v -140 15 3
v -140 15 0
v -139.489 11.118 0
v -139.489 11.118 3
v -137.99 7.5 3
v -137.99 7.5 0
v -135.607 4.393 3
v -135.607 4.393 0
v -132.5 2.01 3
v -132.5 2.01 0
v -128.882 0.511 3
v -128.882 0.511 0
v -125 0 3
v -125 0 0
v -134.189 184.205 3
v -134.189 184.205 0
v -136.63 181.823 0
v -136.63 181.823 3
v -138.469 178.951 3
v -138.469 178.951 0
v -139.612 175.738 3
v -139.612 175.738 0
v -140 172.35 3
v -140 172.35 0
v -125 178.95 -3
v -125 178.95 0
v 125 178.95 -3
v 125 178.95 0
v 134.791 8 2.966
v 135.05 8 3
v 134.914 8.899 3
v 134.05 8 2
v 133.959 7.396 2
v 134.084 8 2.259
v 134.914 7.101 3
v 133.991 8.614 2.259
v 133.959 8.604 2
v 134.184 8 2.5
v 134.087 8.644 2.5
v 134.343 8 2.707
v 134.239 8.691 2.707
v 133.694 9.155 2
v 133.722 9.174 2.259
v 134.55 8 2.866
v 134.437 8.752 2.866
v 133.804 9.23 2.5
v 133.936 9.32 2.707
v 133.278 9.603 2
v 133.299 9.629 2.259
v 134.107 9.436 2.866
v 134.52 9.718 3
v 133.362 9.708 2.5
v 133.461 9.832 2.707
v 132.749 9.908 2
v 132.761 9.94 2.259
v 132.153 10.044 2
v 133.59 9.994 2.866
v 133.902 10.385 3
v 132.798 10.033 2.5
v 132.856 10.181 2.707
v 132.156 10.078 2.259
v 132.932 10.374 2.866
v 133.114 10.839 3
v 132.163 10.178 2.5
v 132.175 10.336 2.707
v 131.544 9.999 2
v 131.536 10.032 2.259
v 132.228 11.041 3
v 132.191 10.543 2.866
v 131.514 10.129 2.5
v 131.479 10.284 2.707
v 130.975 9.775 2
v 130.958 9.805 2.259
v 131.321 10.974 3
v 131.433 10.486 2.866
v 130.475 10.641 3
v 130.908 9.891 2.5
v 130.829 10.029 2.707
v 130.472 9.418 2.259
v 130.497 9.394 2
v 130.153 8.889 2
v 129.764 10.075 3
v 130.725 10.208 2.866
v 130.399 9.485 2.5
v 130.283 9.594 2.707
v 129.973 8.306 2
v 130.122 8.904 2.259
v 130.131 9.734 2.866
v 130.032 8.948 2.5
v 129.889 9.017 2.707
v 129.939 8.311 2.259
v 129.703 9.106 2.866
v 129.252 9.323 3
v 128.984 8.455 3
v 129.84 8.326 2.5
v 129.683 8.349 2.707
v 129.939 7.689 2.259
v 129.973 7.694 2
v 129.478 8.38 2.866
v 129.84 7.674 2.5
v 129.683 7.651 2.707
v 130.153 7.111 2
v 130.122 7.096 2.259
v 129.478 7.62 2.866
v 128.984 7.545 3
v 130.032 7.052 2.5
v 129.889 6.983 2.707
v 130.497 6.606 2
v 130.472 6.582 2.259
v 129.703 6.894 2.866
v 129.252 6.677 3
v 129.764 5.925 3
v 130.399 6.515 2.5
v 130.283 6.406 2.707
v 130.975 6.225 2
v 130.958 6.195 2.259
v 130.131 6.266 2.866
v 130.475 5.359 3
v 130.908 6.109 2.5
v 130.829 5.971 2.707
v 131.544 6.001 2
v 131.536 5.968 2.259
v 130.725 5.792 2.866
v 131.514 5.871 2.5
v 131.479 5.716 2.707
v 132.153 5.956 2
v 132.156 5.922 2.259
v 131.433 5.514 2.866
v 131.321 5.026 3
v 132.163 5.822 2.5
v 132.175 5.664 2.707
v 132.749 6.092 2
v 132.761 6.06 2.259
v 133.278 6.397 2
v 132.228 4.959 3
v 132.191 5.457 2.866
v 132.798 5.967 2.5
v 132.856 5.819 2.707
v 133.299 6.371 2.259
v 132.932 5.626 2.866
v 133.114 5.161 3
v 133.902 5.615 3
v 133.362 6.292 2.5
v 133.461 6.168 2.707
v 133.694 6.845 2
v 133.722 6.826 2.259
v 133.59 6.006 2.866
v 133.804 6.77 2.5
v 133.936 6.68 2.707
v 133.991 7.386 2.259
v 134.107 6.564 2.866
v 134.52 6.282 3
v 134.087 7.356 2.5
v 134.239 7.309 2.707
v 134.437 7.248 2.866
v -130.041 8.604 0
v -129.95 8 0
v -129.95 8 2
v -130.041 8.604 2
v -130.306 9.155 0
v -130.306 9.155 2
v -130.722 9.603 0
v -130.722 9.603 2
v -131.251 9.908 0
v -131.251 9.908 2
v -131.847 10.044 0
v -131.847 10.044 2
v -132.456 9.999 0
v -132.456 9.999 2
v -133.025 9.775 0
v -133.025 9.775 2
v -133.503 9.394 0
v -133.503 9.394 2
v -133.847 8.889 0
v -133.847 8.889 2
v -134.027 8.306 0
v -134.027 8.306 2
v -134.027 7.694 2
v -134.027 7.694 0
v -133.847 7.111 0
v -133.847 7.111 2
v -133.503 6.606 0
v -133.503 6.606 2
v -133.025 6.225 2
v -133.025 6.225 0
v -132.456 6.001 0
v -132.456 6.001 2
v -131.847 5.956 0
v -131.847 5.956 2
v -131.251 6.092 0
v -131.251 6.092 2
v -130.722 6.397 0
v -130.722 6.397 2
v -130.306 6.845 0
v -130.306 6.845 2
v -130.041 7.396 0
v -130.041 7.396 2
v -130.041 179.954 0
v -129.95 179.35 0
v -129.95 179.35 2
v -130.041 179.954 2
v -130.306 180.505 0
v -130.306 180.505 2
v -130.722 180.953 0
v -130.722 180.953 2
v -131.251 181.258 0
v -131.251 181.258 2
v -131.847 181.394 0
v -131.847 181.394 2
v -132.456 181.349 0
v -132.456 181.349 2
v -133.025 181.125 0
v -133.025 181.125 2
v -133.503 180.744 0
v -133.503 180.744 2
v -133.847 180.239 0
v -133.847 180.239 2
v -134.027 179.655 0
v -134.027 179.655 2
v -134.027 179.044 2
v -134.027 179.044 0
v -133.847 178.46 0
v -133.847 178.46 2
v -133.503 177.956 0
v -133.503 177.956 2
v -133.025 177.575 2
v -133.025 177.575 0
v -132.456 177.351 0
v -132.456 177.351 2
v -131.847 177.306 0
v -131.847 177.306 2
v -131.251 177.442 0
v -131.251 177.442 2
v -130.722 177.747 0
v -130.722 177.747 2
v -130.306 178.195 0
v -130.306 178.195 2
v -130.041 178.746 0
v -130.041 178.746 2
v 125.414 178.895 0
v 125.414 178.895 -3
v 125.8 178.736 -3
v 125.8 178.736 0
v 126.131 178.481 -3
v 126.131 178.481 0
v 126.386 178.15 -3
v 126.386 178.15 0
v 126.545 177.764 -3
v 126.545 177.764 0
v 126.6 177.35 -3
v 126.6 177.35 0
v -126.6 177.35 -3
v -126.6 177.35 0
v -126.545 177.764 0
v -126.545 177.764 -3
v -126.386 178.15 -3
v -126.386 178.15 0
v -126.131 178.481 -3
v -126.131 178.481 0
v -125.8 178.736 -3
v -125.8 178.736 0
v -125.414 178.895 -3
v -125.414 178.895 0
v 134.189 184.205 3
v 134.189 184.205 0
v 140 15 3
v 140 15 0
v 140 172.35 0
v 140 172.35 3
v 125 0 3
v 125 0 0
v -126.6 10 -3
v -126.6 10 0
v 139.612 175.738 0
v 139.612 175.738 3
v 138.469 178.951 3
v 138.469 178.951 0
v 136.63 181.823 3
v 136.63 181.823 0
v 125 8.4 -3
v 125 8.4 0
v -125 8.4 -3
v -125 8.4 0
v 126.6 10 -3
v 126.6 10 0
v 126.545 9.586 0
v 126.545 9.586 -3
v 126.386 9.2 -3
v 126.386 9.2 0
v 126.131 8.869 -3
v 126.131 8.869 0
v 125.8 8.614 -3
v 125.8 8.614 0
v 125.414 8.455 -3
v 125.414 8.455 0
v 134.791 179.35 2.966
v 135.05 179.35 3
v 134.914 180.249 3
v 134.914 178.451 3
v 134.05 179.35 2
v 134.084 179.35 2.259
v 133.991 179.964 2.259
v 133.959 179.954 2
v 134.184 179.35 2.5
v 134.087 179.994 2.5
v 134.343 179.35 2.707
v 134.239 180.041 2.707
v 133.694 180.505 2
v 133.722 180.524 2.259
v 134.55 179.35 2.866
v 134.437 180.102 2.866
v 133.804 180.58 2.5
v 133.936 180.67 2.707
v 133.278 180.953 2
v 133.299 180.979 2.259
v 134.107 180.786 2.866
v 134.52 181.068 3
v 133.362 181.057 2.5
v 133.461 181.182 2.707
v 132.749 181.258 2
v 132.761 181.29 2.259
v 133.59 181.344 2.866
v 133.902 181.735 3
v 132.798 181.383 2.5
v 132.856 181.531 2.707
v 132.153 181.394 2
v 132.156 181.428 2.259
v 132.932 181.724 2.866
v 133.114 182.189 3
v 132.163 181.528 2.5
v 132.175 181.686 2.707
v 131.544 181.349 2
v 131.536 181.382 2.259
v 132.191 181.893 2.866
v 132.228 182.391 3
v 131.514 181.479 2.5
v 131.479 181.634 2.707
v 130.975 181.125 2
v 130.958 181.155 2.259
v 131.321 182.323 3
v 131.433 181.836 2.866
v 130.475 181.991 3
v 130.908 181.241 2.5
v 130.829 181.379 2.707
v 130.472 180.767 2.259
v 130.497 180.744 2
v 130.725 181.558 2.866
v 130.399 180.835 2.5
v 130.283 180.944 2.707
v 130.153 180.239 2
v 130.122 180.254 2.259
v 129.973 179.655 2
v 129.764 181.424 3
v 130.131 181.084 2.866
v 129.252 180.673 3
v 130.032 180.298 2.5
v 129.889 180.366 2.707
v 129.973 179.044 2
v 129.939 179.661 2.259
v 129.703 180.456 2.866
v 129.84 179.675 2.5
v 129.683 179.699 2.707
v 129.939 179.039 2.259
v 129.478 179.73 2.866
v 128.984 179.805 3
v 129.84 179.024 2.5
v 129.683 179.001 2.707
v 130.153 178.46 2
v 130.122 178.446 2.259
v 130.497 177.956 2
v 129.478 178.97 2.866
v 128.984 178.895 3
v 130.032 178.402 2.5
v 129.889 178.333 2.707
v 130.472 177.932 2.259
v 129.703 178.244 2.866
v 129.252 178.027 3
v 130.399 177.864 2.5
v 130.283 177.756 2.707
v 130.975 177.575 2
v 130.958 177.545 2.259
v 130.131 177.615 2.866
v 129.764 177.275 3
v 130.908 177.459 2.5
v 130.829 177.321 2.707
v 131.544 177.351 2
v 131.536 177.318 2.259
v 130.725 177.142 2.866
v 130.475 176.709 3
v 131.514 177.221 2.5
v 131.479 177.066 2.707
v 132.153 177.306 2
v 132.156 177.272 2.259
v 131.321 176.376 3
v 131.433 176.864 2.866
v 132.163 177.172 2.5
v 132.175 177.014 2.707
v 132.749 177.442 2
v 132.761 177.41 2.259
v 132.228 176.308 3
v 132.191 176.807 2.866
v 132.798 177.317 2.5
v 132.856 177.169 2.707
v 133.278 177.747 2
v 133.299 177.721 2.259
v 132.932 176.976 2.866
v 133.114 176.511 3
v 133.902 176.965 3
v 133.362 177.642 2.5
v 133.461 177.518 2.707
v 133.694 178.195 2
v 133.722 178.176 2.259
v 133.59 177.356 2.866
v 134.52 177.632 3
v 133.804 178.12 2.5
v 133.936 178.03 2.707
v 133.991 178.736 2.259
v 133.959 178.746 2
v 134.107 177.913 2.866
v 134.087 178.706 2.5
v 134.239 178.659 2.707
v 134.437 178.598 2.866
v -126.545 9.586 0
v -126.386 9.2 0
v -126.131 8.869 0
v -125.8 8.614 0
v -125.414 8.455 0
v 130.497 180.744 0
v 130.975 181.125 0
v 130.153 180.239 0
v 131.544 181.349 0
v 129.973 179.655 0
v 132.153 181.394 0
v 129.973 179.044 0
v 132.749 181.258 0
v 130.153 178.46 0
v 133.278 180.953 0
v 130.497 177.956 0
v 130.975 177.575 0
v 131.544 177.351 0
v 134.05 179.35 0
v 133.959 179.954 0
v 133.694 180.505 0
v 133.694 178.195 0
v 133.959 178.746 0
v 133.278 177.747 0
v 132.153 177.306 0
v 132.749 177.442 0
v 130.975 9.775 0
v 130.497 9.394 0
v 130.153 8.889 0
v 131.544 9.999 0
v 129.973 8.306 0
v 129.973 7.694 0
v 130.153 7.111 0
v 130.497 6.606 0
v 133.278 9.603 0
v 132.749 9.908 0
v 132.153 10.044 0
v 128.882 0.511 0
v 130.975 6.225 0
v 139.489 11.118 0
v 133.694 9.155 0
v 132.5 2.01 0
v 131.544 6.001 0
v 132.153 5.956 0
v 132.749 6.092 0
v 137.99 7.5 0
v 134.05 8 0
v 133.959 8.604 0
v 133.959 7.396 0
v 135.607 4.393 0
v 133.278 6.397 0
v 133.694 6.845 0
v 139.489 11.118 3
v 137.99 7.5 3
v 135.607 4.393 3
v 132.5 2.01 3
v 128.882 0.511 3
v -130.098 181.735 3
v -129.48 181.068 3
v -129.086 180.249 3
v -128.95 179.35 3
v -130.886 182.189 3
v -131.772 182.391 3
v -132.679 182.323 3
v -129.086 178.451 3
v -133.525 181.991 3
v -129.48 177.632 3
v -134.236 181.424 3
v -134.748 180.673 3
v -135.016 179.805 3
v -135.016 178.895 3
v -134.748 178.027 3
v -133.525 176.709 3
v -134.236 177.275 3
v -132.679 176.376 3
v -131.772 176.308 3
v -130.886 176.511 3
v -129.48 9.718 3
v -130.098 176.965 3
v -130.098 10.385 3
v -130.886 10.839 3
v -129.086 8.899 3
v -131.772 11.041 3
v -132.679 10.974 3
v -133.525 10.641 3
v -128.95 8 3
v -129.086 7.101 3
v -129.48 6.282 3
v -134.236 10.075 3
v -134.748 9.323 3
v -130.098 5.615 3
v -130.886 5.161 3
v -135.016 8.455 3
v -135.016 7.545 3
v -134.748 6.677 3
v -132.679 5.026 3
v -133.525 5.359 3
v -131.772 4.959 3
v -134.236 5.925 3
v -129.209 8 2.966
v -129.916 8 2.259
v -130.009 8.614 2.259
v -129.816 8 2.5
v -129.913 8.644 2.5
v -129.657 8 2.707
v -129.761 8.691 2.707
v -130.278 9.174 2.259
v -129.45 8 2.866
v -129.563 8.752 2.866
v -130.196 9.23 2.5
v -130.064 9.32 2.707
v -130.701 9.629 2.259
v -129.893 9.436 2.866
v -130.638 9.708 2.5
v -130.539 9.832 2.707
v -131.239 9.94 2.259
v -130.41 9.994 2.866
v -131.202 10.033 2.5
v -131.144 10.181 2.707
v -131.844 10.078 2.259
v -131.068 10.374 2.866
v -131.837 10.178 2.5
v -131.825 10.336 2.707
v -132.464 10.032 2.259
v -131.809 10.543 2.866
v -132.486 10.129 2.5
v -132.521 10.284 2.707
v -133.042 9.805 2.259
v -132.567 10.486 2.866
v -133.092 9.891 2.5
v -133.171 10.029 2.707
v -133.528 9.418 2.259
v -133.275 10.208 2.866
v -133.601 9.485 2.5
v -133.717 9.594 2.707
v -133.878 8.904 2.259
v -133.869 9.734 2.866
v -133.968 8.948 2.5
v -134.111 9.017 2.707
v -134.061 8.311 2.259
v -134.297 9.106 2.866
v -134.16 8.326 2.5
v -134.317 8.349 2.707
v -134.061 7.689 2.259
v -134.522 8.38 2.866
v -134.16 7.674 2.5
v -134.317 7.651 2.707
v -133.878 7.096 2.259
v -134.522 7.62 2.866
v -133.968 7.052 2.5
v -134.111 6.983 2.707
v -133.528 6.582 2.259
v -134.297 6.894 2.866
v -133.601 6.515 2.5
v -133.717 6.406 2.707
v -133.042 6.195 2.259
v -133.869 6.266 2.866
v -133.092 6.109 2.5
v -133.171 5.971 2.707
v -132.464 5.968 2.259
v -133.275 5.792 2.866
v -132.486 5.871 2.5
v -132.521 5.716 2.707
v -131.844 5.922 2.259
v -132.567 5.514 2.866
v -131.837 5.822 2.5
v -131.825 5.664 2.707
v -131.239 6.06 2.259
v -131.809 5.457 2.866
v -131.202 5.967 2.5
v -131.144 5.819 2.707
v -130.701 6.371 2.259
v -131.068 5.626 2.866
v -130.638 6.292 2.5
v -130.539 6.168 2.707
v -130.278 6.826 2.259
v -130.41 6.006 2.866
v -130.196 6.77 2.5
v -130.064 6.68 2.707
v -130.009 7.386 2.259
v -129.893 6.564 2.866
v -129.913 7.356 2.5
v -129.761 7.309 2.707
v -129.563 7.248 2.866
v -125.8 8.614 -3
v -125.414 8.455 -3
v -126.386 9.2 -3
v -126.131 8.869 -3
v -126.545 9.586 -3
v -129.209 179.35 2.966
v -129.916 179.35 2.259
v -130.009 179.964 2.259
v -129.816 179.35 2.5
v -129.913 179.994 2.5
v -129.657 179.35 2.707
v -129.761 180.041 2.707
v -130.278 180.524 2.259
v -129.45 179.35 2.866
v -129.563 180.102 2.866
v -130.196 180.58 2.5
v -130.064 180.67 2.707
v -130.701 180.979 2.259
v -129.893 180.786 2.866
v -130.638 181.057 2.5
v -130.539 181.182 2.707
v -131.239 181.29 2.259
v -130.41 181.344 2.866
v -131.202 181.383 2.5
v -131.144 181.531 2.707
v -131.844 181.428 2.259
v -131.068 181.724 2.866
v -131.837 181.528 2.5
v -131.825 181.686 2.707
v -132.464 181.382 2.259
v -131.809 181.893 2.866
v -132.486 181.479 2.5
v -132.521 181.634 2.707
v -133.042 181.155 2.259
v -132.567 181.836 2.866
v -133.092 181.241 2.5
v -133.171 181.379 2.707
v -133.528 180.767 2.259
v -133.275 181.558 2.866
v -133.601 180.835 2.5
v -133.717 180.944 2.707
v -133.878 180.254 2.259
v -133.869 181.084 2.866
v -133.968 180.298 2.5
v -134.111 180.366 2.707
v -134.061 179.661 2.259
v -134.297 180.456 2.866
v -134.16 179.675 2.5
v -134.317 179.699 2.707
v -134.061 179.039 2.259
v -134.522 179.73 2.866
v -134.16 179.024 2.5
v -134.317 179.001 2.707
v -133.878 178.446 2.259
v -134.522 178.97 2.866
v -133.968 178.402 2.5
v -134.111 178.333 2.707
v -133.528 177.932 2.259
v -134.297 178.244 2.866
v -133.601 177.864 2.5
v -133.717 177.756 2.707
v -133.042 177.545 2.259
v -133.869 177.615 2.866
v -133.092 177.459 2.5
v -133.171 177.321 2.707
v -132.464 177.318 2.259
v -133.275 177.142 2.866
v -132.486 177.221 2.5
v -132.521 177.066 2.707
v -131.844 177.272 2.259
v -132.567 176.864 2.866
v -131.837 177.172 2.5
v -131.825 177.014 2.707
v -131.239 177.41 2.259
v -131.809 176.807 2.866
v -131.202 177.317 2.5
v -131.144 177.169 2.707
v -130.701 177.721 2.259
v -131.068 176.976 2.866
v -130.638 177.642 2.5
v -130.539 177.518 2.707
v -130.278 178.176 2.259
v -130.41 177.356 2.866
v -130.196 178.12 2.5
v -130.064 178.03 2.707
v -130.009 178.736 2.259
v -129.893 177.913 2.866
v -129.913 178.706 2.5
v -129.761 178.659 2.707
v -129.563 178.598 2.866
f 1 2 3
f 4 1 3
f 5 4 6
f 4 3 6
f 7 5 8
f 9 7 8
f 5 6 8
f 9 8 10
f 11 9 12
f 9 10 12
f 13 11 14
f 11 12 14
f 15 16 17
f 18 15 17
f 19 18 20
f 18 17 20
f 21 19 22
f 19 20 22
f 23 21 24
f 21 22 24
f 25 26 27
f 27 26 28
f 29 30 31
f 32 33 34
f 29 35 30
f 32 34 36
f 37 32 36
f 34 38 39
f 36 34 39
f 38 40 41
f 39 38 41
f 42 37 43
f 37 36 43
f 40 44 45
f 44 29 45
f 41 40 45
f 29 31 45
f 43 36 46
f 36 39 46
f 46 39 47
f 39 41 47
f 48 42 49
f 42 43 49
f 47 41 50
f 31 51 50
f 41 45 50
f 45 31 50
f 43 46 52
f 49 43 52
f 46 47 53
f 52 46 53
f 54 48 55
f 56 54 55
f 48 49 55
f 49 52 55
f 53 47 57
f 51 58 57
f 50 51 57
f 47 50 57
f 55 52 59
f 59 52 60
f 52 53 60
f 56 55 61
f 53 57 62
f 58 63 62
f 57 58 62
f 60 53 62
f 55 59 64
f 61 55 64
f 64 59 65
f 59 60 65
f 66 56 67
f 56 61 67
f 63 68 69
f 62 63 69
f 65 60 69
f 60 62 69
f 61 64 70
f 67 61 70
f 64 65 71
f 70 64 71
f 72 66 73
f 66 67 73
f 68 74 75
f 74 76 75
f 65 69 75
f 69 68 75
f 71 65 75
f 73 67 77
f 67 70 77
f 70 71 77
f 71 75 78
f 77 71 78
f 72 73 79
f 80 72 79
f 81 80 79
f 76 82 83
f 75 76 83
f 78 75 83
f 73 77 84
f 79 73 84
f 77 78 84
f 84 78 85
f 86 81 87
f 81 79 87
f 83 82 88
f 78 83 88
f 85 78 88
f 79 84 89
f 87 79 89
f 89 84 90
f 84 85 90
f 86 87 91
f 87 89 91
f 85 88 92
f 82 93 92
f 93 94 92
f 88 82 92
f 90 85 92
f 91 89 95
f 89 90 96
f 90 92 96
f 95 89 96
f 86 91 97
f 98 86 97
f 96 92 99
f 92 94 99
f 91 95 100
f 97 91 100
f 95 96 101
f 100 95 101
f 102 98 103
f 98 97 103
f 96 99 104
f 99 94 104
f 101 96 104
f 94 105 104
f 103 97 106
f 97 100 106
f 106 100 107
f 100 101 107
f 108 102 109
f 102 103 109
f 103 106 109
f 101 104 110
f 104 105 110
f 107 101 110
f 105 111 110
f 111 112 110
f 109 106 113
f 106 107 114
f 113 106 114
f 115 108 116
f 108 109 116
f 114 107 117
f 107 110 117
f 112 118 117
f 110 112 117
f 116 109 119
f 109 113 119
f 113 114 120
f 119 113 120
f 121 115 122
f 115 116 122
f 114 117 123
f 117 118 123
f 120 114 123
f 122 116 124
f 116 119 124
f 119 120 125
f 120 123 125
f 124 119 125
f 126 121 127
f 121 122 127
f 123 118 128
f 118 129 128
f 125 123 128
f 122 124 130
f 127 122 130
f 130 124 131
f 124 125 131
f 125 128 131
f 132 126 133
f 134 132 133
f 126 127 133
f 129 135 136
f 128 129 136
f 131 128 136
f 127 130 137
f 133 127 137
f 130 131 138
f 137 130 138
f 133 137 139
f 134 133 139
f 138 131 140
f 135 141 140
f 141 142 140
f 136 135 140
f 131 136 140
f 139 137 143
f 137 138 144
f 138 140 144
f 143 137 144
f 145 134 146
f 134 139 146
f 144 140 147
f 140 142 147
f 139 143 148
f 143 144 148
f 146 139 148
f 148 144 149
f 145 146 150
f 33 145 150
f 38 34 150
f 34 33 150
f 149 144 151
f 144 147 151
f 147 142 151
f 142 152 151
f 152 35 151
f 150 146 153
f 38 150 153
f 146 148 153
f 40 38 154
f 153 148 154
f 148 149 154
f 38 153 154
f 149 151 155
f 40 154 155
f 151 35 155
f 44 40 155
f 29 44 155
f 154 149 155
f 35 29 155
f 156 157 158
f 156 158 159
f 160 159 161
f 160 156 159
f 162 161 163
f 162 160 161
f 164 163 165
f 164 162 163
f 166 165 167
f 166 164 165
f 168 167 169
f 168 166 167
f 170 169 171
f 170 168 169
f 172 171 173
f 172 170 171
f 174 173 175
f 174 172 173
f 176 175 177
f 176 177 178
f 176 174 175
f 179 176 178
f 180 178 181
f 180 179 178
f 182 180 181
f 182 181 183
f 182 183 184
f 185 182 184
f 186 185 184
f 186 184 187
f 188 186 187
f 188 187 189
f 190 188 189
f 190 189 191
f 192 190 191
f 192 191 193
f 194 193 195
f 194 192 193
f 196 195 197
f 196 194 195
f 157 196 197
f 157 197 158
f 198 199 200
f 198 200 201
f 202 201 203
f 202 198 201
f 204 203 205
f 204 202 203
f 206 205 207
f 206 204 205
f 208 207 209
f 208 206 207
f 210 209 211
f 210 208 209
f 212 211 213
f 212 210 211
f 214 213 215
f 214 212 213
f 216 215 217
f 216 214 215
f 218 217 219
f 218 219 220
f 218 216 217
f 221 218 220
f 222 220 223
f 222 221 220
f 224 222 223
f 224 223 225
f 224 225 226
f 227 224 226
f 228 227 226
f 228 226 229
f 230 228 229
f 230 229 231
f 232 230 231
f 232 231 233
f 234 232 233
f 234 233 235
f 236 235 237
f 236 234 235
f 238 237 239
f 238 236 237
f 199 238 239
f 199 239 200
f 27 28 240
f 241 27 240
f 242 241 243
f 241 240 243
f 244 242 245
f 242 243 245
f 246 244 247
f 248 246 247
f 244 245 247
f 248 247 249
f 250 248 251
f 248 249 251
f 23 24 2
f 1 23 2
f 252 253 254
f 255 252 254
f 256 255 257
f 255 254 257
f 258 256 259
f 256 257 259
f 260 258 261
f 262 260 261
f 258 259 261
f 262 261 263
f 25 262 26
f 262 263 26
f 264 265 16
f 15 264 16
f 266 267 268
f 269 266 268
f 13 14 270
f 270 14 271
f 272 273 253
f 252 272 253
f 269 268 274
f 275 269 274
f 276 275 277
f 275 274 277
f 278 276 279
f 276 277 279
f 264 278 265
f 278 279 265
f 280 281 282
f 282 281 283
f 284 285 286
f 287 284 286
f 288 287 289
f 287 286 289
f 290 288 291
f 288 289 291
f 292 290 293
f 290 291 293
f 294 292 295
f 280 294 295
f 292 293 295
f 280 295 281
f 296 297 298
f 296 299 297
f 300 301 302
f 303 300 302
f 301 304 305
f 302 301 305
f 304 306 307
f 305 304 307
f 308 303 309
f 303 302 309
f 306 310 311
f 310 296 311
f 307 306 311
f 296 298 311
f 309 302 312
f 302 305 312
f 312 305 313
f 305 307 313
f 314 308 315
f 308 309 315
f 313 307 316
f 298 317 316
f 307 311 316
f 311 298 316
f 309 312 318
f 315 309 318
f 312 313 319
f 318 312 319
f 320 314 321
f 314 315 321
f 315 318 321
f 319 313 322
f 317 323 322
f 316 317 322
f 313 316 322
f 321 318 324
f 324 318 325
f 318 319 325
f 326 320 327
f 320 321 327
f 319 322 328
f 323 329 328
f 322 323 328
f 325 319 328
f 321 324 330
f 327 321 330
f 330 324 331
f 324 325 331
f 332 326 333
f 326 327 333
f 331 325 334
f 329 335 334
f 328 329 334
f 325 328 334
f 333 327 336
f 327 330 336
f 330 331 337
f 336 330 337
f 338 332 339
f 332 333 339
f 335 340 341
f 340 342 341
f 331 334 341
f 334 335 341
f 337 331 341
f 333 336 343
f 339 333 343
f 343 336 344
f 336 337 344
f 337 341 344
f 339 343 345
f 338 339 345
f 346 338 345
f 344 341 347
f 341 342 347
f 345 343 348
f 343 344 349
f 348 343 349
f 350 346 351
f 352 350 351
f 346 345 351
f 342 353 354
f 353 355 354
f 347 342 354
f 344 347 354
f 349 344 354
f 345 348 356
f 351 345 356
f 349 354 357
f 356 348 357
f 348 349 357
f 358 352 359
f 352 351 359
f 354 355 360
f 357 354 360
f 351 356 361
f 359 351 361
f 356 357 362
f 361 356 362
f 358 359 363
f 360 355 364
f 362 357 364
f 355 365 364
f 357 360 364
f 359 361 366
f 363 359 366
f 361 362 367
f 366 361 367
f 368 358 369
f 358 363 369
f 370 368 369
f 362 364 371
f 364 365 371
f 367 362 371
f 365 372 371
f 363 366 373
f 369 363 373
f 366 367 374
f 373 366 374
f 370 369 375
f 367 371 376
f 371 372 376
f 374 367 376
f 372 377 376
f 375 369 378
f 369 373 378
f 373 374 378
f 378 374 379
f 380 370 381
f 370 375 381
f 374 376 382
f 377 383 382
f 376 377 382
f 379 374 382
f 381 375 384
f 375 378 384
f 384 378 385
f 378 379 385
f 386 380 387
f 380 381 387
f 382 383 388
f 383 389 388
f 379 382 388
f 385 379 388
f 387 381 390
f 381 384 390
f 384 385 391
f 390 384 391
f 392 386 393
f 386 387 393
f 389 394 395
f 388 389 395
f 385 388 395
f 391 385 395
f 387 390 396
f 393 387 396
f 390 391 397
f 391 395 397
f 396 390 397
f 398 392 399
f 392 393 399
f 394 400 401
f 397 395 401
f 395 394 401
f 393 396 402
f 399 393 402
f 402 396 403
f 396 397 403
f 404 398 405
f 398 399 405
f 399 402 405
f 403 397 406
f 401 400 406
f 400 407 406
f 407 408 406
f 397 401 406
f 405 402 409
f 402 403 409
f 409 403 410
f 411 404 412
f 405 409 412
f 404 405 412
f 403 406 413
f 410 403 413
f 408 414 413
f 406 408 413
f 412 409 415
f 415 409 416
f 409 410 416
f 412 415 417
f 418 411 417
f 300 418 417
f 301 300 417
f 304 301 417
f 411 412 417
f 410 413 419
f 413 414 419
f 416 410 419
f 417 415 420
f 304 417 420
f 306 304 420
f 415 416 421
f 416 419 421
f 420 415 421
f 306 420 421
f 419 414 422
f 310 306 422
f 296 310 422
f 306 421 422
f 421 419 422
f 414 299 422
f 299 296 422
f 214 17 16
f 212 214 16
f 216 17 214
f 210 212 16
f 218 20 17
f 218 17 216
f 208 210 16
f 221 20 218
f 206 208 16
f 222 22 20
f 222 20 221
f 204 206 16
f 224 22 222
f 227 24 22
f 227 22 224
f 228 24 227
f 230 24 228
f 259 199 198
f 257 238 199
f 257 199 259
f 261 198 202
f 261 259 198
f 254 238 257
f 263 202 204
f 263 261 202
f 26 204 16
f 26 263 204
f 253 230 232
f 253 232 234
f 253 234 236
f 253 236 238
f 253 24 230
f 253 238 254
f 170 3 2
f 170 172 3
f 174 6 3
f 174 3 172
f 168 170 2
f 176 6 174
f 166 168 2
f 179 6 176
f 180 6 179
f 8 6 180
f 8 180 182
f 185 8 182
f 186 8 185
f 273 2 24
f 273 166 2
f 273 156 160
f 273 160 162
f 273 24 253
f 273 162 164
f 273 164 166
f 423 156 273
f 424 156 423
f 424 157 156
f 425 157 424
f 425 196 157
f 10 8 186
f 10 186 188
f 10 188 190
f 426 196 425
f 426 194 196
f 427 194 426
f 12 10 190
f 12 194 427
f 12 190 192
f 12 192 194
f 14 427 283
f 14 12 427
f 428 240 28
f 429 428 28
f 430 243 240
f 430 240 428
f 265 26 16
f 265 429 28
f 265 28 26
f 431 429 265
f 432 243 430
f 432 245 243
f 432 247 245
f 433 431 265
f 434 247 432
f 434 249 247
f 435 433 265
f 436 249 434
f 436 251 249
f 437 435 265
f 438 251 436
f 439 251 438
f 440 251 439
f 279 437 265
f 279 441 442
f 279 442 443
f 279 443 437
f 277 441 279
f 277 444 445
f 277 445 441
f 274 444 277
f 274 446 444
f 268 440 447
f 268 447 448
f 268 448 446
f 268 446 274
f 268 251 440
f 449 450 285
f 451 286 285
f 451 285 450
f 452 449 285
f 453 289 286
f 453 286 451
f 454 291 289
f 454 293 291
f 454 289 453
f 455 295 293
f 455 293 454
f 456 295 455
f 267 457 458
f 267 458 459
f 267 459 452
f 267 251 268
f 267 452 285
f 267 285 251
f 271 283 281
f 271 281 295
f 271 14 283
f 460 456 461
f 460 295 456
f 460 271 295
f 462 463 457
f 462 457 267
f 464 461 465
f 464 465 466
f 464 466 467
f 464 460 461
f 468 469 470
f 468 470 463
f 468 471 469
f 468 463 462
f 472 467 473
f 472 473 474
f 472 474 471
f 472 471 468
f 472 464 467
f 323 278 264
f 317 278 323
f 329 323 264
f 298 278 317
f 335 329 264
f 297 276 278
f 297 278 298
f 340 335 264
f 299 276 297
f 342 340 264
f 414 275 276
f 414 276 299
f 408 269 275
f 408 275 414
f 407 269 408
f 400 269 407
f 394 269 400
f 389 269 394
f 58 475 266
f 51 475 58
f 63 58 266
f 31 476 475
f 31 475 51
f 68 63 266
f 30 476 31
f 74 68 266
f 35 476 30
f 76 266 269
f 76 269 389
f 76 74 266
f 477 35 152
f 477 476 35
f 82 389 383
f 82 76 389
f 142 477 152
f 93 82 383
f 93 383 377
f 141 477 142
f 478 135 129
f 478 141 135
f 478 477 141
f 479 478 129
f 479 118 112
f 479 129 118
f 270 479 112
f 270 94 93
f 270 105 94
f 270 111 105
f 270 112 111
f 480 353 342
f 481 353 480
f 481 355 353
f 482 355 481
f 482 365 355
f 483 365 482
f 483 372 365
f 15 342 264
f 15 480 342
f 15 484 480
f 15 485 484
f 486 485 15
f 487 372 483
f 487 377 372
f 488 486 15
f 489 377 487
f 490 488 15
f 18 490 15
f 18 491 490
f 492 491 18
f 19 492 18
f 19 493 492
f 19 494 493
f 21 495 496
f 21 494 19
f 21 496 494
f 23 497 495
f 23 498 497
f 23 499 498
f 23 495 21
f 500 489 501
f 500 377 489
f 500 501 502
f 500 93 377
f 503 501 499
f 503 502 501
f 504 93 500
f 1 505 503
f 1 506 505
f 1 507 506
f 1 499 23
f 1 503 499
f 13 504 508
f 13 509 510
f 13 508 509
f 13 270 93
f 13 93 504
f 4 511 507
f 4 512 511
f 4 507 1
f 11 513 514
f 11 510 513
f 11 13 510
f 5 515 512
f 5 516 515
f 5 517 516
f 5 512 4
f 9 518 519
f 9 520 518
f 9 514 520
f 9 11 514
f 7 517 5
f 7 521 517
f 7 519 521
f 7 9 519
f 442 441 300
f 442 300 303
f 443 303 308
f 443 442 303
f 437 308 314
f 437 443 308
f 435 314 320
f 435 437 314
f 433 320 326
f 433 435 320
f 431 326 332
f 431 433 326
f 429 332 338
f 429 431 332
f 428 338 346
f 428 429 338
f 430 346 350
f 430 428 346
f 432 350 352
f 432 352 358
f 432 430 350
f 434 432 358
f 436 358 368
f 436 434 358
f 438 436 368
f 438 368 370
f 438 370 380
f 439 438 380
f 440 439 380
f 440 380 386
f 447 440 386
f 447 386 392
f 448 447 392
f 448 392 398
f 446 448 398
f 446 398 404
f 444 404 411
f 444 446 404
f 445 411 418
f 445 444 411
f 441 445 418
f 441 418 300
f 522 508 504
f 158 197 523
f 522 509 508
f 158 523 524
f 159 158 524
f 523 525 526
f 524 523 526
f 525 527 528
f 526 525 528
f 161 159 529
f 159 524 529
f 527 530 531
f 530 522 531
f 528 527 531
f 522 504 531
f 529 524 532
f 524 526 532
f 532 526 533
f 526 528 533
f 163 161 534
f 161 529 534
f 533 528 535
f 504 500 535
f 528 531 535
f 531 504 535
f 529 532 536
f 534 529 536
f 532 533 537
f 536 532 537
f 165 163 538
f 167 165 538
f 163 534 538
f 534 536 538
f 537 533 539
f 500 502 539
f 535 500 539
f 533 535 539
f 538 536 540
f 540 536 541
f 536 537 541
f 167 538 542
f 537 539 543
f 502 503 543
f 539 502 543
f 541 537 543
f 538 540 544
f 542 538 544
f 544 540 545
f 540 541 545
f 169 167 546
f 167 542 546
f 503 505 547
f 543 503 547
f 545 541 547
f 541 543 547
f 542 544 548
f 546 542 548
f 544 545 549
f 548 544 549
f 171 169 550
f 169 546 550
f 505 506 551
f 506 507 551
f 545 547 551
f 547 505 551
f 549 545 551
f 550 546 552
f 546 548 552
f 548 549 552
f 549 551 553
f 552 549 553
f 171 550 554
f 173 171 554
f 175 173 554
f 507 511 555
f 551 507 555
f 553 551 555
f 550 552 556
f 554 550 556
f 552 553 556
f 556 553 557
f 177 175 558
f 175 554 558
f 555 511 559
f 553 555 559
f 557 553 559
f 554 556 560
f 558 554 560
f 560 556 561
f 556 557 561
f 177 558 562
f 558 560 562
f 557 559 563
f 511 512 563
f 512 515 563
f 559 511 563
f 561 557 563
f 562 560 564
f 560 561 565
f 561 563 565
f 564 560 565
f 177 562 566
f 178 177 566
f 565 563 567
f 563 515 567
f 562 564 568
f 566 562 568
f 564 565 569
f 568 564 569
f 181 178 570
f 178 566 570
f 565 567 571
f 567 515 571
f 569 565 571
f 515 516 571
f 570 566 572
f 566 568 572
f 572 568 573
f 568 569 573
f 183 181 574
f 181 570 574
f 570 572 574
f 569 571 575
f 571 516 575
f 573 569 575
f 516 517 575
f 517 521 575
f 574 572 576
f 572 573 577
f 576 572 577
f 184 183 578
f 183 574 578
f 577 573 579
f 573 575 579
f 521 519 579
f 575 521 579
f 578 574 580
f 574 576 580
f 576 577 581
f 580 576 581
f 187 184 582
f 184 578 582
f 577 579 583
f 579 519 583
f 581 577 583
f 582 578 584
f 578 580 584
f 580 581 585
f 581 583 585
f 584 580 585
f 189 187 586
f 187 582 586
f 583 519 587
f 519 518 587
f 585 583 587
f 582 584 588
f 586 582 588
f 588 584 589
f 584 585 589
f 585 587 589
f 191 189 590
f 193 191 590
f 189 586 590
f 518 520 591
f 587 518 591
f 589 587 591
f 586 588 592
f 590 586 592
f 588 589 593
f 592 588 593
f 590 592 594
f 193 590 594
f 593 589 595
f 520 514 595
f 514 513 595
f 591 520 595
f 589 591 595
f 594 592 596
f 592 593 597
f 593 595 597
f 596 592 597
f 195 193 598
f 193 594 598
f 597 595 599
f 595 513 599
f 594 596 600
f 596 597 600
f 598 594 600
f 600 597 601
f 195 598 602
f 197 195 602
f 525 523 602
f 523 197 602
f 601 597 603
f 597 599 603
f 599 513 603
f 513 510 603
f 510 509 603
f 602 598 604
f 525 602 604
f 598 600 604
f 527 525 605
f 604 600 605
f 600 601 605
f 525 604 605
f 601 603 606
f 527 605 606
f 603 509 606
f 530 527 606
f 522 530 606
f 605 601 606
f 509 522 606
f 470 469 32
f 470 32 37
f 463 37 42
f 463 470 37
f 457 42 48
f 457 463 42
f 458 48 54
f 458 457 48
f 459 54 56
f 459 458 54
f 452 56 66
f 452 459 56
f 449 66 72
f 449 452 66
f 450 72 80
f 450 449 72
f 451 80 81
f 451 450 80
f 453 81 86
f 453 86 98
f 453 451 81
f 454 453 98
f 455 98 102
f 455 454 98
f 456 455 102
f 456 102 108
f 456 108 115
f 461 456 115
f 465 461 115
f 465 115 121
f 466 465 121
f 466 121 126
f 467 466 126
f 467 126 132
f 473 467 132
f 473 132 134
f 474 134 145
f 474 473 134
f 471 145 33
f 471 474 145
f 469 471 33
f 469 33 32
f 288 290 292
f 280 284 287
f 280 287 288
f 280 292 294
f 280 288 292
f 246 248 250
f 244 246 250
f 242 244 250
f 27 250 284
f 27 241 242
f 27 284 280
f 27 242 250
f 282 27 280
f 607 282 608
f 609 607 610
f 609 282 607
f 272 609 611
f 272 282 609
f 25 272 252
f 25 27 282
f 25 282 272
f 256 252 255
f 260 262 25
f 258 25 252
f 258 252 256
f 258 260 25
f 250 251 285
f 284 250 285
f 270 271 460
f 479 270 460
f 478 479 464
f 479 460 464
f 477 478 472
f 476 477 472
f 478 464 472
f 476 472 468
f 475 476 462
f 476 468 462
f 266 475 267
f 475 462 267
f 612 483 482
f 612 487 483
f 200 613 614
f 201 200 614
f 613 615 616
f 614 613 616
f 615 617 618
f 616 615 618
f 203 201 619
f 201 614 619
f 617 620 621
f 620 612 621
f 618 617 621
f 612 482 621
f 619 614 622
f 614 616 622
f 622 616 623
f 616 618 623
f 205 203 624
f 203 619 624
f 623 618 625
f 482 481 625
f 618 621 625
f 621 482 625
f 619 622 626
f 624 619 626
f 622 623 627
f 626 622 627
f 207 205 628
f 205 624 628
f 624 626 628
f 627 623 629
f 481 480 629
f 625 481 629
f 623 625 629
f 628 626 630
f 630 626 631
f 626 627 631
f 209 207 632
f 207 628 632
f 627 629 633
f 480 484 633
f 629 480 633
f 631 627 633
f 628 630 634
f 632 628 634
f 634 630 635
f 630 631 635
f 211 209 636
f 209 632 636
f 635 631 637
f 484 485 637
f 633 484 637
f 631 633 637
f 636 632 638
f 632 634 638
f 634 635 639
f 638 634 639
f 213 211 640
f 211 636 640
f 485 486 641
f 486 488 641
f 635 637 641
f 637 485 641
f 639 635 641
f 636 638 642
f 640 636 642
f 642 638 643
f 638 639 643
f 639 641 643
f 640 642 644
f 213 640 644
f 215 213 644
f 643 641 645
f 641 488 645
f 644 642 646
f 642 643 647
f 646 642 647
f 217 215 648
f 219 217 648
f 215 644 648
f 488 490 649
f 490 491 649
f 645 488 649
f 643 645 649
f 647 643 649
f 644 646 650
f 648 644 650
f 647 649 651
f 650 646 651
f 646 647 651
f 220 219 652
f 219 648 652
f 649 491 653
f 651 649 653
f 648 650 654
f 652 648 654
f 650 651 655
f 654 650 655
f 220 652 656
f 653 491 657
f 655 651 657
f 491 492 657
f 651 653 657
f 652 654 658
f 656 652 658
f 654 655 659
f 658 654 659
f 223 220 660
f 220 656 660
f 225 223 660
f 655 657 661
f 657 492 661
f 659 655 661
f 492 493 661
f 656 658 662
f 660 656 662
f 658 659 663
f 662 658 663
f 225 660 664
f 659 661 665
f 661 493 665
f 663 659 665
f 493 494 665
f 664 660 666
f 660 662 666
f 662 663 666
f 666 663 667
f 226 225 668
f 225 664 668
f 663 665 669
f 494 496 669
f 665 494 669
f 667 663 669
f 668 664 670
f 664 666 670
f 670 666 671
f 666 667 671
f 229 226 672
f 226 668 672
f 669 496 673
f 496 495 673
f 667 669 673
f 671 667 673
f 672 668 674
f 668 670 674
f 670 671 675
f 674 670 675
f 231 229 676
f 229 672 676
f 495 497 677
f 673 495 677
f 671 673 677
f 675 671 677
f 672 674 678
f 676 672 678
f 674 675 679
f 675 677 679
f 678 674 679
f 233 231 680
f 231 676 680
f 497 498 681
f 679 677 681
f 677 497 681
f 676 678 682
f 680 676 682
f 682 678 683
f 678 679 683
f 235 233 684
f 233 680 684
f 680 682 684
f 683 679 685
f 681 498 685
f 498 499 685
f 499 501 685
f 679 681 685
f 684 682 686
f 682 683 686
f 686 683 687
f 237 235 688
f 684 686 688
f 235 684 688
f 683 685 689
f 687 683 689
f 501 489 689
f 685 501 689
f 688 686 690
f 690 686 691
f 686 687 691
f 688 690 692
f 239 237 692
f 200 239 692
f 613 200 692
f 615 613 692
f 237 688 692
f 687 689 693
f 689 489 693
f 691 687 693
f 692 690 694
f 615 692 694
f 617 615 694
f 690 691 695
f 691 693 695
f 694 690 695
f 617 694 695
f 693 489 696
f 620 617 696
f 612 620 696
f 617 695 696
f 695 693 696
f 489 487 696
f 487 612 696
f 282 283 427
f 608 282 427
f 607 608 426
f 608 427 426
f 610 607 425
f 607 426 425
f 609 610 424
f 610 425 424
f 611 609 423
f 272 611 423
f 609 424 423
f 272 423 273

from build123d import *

# Parameters (mm, degrees)
SKETCH2_R           = 2.05
BOSS_EXTRUDE1_DEPTH = 3
BOSS_EXTRUDE2_DEPTH = 3
FILLET1_R           = 1


with BuildPart() as part:
    # Sketch2 → Boss-Extrude1 (new body)
    # profile 1 of 2: a face of its own
    with BuildSketch(Plane(origin=(0, 0, 0), x_dir=(-1, 0, 0), z_dir=(0, 0, 1))):
        with BuildLine():
            Line((125, 0), (-125, 0))
            ThreePointArc((-125, 0), (-135.606601718, -4.393398282), (-140, -15))
            Line((-140, -15), (-140, -172.349939952))
            ThreePointArc((-140, -172.349939952), (-138.469261815, -178.951378141), (-134.189468511, -184.205473195))
            Line((-134.189468511, -184.205473195), (134.189468511, -184.205473195))
            ThreePointArc((134.189468511, -184.205473195), (138.469261815, -178.951378141), (140, -172.349939952))
            Line((140, -172.349939952), (140, -15))
            ThreePointArc((140, -15), (135.606601718, -4.393398282), (125, 0))
        make_face()
        with Locations(Location((132, -179.349939952, 0), (0, 0, 180))):
            Circle(SKETCH2_R, mode=Mode.SUBTRACT)
        with Locations(Location((132, -8, 0), (0, 0, 180))):
            Circle(SKETCH2_R, mode=Mode.SUBTRACT)
        with Locations(Location((-132, -8, 0), (0, 0, 180))):
            Circle(SKETCH2_R, mode=Mode.SUBTRACT)
        with Locations(Location((-132, -179.349939952, 0), (0, 0, 180))):
            Circle(SKETCH2_R, mode=Mode.SUBTRACT)
        with BuildLine():
            ThreePointArc((127, -10), (126.414213562, -8.585786438), (125, -8))
            Line((125, -8), (-125, -8))
            ThreePointArc((-125, -8), (-126.414213562, -8.585786438), (-127, -10))
            Line((-127, -10), (-127, -177.349939952))
            ThreePointArc((-127, -177.349939952), (-126.414213562, -178.764153514), (-125, -179.349939952))
            Line((-125, -179.349939952), (125, -179.349939952))
            ThreePointArc((125, -179.349939952), (126.414213562, -178.764153514), (127, -177.349939952))
            Line((127, -177.349939952), (127, -10))
        make_face(mode=Mode.SUBTRACT)
    # profile 2 of 2: a face of its own
    with BuildSketch(Plane(origin=(0, 0, 0), x_dir=(-1, 0, 0), z_dir=(0, 0, 1))):
        with BuildLine():
            Line((127, -10), (127, -177.349939952))
            ThreePointArc((127, -177.349939952), (126.414213562, -178.764153514), (125, -179.349939952))
            Line((125, -179.349939952), (-125, -179.349939952))
            ThreePointArc((-125, -179.349939952), (-126.414213562, -178.764153514), (-127, -177.349939952))
            Line((-127, -177.349939952), (-127, -10))
            ThreePointArc((-127, -10), (-126.414213562, -8.585786438), (-125, -8))
            Line((-125, -8), (125, -8))
            ThreePointArc((125, -8), (126.414213562, -8.585786438), (127, -10))
        make_face()
    extrude(amount=BOSS_EXTRUDE1_DEPTH)

    # Sketch3 → Boss-Extrude2 (add)
    with BuildSketch(Plane(origin=(0, 0, 0), x_dir=(-1, 0, 0), z_dir=(0, 0, -1))):
        with BuildLine():
            Line((-126.6, 177.349939952), (-126.6, 10))
            ThreePointArc((-126.6, 10), (-126.13137085, 8.86862915), (-125, 8.4))
            Line((-125, 8.4), (125, 8.4))
            ThreePointArc((125, 8.4), (126.13137085, 8.86862915), (126.6, 10))
            Line((126.6, 10), (126.6, 177.349939952))
            ThreePointArc((126.6, 177.349939952), (126.13137085, 178.481310802), (125, 178.949939952))
            Line((125, 178.949939952), (-125, 178.949939952))
            ThreePointArc((-125, 178.949939952), (-126.13137085, 178.481310802), (-126.6, 177.349939952))
        make_face()
    extrude(amount=BOSS_EXTRUDE2_DEPTH)

    # Fillet1
    fillet1_edges = [part.edges().sort_by_distance(p)[0] for p in [
        (-134.05, 8, 3),
        (129.95, 8, 3),
        (129.95, 179.349939952, 3),
        (-134.05, 179.349939952, 3),
    ]]
    fillet(fillet1_edges, radius=FILLET1_R)


solid = part.part
